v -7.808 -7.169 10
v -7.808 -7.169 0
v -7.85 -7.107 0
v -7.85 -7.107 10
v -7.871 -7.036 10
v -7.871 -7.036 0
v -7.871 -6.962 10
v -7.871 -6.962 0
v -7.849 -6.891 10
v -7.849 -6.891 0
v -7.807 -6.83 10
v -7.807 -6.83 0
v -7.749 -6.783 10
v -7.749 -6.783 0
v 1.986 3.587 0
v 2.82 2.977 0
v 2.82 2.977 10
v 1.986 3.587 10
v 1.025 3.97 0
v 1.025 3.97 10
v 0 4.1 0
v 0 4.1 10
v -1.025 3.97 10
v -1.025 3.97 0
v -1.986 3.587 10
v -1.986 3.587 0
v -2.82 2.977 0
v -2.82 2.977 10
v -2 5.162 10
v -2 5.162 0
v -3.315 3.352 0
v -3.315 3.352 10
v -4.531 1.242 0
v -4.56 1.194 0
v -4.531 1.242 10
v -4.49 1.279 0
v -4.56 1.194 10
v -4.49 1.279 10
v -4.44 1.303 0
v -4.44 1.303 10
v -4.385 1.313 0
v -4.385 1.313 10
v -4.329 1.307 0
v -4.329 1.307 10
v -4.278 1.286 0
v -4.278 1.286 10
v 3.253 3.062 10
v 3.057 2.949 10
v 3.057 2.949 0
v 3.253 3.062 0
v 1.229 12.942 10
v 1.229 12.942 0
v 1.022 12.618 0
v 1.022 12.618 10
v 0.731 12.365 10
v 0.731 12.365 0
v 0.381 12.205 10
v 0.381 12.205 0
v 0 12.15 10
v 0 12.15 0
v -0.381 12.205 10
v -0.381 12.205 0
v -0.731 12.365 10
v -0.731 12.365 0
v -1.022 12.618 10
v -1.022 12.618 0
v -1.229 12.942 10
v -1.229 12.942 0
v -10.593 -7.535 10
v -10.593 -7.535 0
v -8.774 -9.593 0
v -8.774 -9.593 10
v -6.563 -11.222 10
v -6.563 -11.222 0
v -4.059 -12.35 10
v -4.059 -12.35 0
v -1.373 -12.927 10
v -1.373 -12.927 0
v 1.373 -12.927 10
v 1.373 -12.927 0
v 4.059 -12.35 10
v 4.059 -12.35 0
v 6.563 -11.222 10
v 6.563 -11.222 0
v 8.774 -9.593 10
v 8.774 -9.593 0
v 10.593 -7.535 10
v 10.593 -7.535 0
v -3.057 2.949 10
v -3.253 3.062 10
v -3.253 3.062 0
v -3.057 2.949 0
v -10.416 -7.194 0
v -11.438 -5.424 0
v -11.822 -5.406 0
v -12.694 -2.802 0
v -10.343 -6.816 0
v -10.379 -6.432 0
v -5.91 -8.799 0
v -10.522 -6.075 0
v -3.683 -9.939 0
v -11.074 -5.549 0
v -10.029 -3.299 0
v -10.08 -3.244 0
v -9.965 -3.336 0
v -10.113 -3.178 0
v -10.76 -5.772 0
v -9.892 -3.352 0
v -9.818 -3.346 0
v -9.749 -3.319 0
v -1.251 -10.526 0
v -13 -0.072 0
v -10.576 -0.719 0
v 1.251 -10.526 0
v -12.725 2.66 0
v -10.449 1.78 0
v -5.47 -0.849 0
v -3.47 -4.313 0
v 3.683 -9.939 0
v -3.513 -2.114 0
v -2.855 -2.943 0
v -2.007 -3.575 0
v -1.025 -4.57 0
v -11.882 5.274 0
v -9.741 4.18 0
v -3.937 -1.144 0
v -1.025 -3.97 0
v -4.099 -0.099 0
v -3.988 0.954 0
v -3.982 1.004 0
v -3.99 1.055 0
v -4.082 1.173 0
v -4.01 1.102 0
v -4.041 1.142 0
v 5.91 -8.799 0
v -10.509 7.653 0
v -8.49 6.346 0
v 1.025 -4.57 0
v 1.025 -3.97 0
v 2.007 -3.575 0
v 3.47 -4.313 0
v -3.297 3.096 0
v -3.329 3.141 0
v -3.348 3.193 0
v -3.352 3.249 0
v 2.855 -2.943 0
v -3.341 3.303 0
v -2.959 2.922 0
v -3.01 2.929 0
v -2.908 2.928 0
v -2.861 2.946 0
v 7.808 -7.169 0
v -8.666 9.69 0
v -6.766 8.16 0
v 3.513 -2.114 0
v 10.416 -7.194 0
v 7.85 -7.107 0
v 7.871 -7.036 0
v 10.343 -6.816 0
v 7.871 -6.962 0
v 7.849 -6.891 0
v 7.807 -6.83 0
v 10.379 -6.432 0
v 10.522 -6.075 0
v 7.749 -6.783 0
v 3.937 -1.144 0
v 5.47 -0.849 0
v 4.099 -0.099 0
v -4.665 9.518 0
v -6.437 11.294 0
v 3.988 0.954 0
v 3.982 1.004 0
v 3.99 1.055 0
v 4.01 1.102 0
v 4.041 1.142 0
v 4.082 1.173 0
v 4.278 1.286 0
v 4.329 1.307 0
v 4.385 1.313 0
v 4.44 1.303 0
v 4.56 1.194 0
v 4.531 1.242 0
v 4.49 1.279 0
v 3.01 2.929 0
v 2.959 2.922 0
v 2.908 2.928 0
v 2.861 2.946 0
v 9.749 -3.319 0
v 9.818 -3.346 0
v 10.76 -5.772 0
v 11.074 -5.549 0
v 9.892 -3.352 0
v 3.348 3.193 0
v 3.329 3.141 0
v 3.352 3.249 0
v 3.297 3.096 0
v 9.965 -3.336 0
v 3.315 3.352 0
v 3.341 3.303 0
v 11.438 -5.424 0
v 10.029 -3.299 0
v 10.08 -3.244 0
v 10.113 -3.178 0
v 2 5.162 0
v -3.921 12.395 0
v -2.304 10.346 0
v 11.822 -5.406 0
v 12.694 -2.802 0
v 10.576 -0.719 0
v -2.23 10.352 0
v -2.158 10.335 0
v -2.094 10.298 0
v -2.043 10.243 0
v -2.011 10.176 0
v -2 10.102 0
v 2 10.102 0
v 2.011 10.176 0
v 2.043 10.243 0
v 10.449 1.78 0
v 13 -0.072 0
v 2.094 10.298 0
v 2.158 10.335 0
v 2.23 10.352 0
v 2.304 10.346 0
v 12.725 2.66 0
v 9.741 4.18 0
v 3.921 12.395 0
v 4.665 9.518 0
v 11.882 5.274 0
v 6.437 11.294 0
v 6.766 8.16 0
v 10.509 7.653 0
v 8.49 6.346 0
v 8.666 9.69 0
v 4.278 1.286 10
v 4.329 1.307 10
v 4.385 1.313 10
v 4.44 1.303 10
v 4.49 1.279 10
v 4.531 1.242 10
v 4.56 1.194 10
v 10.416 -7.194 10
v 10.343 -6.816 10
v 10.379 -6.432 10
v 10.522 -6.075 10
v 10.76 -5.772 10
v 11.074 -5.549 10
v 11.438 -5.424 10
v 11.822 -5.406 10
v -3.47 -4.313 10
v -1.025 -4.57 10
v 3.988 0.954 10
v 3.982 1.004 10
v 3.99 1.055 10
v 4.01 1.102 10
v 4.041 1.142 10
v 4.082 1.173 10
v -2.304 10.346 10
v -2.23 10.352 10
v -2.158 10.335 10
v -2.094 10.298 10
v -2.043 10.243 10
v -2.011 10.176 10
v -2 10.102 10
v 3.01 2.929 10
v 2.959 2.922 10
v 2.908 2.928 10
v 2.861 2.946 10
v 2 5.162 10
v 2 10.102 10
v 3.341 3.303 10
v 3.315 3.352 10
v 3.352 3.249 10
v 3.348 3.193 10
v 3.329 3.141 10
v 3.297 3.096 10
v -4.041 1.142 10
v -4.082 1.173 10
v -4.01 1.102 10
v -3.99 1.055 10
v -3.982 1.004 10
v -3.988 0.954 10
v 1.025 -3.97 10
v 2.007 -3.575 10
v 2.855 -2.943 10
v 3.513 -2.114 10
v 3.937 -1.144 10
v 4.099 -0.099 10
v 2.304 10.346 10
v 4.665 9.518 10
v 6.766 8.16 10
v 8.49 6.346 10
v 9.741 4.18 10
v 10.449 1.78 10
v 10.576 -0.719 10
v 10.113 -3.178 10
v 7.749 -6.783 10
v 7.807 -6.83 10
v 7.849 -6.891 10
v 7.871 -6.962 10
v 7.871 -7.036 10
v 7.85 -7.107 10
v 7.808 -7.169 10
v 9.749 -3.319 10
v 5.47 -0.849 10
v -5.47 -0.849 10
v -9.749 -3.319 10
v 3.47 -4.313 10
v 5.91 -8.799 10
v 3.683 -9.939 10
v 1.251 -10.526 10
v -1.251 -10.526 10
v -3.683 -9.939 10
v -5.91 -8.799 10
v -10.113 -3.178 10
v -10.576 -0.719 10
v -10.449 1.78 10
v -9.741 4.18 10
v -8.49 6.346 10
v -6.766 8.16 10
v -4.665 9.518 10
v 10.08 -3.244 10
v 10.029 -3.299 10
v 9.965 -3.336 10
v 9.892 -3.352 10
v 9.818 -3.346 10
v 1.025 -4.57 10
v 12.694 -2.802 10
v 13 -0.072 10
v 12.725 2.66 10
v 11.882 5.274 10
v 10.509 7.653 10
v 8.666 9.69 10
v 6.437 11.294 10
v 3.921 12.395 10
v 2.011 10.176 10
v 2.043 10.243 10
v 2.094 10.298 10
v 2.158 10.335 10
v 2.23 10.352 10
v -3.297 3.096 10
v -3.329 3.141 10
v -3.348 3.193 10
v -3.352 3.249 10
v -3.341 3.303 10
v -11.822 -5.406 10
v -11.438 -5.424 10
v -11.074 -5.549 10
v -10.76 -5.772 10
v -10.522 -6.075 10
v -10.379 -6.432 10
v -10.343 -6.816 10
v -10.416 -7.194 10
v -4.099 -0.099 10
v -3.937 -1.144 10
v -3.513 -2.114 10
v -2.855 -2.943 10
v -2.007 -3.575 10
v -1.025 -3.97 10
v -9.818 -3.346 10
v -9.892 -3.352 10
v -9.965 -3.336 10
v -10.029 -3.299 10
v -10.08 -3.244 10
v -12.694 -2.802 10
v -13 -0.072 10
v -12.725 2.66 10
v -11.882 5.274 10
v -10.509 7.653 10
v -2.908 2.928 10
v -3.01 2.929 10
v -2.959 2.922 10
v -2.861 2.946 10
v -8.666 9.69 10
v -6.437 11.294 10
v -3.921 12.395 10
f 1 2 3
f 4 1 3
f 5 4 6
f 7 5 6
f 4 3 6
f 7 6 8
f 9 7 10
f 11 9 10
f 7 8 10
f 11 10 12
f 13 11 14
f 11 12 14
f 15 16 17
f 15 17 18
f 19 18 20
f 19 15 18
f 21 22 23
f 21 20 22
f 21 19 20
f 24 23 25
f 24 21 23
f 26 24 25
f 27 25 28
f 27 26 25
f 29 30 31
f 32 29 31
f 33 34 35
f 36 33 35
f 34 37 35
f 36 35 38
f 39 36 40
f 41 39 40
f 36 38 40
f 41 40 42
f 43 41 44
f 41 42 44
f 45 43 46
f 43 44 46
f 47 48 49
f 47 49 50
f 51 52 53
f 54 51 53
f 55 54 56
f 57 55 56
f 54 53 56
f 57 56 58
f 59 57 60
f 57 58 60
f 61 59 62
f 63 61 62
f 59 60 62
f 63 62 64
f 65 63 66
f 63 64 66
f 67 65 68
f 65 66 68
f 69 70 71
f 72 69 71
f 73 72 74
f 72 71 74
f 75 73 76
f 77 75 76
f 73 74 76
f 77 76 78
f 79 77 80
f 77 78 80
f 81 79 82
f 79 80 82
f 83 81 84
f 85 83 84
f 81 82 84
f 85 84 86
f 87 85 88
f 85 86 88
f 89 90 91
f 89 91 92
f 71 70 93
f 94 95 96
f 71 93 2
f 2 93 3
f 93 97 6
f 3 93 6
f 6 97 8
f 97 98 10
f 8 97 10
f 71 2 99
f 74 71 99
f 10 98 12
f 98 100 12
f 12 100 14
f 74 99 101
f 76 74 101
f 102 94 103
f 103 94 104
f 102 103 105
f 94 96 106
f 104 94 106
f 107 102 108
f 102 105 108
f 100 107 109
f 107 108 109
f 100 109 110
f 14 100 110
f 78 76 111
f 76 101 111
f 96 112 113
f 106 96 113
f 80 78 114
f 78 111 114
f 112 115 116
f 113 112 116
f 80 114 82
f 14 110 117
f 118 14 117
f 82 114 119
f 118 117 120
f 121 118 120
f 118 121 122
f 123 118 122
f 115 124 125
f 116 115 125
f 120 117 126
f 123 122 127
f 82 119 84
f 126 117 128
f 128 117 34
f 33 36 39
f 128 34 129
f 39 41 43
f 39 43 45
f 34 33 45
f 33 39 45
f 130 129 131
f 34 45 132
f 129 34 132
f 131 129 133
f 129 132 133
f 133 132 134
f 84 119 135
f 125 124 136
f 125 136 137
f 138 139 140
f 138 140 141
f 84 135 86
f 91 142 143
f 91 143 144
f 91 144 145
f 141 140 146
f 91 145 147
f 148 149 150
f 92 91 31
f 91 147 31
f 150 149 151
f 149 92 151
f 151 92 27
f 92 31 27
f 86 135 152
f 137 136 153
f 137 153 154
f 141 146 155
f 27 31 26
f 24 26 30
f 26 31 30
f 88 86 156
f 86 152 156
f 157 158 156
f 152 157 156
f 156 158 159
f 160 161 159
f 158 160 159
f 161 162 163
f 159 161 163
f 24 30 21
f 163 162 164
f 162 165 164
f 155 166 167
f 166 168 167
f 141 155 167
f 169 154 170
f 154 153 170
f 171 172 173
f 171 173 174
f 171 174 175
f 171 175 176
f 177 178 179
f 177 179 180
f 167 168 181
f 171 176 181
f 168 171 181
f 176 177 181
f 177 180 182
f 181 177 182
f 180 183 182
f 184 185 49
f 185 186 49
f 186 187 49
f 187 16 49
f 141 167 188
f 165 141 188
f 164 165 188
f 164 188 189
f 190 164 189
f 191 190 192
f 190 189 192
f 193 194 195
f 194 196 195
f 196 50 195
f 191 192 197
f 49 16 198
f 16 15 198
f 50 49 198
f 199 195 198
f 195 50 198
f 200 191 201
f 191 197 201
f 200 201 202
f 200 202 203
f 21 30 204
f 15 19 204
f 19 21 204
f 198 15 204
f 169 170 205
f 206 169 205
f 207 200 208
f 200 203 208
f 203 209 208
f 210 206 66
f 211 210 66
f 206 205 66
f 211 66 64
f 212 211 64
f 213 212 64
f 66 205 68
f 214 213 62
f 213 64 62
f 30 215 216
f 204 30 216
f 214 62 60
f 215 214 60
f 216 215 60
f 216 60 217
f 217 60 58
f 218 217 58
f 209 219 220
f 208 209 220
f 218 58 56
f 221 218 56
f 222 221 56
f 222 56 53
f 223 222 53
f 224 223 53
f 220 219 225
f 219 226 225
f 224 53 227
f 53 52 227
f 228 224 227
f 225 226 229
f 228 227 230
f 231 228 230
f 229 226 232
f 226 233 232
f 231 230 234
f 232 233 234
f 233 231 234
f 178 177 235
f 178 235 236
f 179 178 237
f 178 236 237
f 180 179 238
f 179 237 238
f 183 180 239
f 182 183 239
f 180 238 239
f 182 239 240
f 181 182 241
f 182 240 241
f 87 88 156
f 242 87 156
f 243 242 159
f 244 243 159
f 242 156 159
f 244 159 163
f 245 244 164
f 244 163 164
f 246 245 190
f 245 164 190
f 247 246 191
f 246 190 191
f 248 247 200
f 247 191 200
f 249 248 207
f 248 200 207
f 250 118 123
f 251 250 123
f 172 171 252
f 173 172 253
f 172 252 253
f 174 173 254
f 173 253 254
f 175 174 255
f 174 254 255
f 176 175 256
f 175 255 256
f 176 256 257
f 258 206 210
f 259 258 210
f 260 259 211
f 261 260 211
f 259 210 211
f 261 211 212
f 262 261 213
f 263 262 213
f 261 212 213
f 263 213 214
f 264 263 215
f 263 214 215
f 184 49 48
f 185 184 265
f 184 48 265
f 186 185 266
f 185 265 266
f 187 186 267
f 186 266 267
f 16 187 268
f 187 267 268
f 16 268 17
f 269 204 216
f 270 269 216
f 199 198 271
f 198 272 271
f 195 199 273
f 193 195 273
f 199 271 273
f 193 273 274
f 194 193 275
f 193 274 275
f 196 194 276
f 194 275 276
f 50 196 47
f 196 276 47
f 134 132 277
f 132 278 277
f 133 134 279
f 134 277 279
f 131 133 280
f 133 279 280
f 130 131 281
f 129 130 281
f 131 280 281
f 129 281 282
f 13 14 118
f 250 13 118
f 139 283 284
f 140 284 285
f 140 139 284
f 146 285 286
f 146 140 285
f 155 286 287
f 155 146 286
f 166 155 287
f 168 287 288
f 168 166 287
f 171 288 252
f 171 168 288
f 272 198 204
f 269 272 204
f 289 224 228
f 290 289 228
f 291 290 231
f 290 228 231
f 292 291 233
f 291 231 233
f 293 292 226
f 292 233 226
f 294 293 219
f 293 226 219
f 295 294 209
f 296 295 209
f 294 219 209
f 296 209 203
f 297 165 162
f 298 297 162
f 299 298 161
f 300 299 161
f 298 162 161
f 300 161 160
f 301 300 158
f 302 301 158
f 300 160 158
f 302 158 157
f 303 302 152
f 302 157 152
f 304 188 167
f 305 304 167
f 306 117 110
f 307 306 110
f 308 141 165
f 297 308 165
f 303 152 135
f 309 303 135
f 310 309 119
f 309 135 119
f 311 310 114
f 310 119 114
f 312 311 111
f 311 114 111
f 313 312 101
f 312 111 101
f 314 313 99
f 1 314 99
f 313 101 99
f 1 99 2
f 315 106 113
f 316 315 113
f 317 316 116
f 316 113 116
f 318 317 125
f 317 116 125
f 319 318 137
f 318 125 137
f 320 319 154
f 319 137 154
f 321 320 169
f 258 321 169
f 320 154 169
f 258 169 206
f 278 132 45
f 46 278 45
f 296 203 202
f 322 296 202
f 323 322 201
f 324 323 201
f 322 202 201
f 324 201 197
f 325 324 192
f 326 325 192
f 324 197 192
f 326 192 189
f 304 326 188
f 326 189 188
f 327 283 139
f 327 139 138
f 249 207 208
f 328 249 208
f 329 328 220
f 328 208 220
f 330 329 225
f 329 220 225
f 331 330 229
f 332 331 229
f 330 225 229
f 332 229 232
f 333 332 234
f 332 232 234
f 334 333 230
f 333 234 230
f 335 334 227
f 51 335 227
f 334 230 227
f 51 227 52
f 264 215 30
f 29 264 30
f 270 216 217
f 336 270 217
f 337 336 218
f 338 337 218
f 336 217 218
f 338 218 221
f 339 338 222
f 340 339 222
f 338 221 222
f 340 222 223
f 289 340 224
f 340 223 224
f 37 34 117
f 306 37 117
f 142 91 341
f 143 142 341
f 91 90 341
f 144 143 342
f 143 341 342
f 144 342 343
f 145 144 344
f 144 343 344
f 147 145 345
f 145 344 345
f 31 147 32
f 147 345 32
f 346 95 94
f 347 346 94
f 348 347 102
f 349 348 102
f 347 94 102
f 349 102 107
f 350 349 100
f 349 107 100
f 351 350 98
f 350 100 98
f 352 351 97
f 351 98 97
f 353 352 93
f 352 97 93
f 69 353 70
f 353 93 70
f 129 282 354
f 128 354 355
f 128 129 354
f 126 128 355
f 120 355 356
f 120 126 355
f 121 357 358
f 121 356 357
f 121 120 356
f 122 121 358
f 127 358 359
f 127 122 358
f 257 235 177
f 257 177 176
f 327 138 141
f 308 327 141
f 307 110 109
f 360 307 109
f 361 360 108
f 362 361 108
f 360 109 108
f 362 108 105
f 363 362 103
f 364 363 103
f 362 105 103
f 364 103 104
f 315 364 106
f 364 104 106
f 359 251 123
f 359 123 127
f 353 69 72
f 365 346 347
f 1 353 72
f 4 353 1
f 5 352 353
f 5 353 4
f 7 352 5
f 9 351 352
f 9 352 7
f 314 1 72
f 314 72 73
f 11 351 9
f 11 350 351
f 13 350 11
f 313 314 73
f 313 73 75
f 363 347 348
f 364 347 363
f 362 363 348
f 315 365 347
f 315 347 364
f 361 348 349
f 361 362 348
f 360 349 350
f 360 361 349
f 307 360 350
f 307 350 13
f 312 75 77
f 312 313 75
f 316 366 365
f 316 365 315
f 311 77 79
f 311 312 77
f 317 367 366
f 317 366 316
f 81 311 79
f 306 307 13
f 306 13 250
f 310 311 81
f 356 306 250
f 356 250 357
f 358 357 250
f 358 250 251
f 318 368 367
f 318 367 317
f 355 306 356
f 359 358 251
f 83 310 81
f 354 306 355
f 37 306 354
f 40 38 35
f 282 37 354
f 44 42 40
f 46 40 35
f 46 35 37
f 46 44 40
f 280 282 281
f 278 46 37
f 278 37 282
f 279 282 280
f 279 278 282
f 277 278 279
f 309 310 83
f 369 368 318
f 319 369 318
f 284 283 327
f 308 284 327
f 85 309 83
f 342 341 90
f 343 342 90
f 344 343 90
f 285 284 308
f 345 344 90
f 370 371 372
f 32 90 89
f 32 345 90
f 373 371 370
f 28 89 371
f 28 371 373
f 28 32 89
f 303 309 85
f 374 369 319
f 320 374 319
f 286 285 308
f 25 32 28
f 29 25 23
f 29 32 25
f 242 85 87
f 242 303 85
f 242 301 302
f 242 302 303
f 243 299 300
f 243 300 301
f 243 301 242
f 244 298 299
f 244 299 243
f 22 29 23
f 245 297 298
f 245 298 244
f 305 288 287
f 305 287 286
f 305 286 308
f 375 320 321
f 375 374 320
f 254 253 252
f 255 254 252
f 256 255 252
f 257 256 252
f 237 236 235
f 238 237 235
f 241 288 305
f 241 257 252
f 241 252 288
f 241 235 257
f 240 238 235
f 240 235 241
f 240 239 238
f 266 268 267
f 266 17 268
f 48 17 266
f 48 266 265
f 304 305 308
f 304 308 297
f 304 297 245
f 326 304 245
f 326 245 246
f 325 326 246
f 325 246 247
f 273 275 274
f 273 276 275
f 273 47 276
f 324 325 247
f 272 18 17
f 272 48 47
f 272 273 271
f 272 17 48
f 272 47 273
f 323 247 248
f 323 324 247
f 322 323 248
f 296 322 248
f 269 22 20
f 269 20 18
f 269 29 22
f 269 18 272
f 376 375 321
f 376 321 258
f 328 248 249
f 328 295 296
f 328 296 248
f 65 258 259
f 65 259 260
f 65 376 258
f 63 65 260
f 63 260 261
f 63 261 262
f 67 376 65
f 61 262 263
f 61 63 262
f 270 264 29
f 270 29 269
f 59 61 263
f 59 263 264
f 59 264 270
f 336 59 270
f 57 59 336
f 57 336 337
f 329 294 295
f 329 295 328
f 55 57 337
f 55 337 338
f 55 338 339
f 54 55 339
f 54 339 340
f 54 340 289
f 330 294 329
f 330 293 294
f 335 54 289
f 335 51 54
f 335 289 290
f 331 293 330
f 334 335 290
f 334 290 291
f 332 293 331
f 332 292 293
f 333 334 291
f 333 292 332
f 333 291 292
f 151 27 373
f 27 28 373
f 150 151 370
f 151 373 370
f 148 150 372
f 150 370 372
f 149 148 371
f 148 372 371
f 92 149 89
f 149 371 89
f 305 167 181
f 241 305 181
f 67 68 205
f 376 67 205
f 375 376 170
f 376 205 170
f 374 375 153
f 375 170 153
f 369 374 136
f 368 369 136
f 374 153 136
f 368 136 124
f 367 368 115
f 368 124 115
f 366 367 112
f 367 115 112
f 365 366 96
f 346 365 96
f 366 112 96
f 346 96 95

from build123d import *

# Parameters (mm, degrees)
SKETCH_1_R               = 4.1
EXTRUDE_1_DEPTH          = 10
CUT_EXTRUDE_1_DEPTH      = 10
PATTERN_CIRCULAR_1_COUNT = 3
FILLET_1_R               = 0.2


with BuildPart() as part:
    # 草图1 → 凸台-拉伸1 (new body)
    with BuildSketch(Plane.XY):
        with BuildLine():
            ThreePointArc((-1.229173411, 12.941759259), (-11.258330249, 6.5), (-11.822478994, -5.40638423))
            ThreePointArc((-11.822478994, -5.40638423), (-10.522208656, -6.075), (-10.593305582, -7.53537503))
            ThreePointArc((-10.593305582, -7.53537503), (0, -13), (10.593305582, -7.53537503))
            ThreePointArc((10.593305582, -7.53537503), (10.522208656, -6.075), (11.822478994, -5.40638423))
            ThreePointArc((11.822478994, -5.40638423), (11.258330249, 6.5), (1.229173411, 12.941759259))
            ThreePointArc((1.229173411, 12.941759259), (0, 12.15), (-1.229173411, 12.941759259))
        make_face()
        Circle(SKETCH_1_R, mode=Mode.SUBTRACT)
    extrude(amount=EXTRUDE_1_DEPTH)

    # 草图2 → 切除-拉伸1 (cut)
    with BuildSketch(Plane.XY):
        with BuildLine():
            Line((-7.748999943, -6.78328828), (-3.470031597, -4.312824754))
            Line((-3.470031597, -4.312824754), (-1.025, -4.56980793))
            Line((-1.025, -4.56980793), (-1.025, -3.96980793))
            ThreePointArc((-1.025, -3.96980793), (0, -4.1), (1.025, -3.96980793))
            Line((1.025, -3.96980793), (1.025, -4.56980793))
            Line((1.025, -4.56980793), (3.470031597, -4.312824754))
            Line((3.470031597, -4.312824754), (7.748999943, -6.78328828))
            ThreePointArc((7.748999943, -6.78328828), (7.871108829, -6.961884233), (7.808154531, -7.168871796))
            ThreePointArc((7.808154531, -7.168871796), (0, -10.6), (-7.808154531, -7.168871796))
            ThreePointArc((-7.808154531, -7.168871796), (-7.871108829, -6.961884233), (-7.748999943, -6.78328828))
        make_face()
    cut_extrude_1 = extrude(amount=CUT_EXTRUDE_1_DEPTH, mode=Mode.SUBTRACT)

    # 阵列(圆周)1: 切除-拉伸1 ×3 about axis
    pattern_circular_1_axis = Axis((0, 0, 0), (0, 0, 1))
    for i in range(1, PATTERN_CIRCULAR_1_COUNT):
        add(cut_extrude_1.rotate(pattern_circular_1_axis, i * 360 / PATTERN_CIRCULAR_1_COUNT), mode=Mode.SUBTRACT)

    # 圆角1
    fillet_1_edges = [part.edges().sort_by_distance(p)[0] for p in [
        (3.445069758, 3.172580004, 5),
        (2.925454515, 2.872580004, 5),
        (3.950454515, 1.097227926, 5),
        (4.470069758, 1.397227926, 5),
        (-4.470069758, 1.397227926, 5),
        (-3.950454515, 1.097227926, 5),
        (-2.925454515, 2.872580004, 5),
        (-3.445069758, 3.172580004, 5),
    ]]
    fillet(fillet_1_edges, radius=FILLET_1_R)


solid = part.part
